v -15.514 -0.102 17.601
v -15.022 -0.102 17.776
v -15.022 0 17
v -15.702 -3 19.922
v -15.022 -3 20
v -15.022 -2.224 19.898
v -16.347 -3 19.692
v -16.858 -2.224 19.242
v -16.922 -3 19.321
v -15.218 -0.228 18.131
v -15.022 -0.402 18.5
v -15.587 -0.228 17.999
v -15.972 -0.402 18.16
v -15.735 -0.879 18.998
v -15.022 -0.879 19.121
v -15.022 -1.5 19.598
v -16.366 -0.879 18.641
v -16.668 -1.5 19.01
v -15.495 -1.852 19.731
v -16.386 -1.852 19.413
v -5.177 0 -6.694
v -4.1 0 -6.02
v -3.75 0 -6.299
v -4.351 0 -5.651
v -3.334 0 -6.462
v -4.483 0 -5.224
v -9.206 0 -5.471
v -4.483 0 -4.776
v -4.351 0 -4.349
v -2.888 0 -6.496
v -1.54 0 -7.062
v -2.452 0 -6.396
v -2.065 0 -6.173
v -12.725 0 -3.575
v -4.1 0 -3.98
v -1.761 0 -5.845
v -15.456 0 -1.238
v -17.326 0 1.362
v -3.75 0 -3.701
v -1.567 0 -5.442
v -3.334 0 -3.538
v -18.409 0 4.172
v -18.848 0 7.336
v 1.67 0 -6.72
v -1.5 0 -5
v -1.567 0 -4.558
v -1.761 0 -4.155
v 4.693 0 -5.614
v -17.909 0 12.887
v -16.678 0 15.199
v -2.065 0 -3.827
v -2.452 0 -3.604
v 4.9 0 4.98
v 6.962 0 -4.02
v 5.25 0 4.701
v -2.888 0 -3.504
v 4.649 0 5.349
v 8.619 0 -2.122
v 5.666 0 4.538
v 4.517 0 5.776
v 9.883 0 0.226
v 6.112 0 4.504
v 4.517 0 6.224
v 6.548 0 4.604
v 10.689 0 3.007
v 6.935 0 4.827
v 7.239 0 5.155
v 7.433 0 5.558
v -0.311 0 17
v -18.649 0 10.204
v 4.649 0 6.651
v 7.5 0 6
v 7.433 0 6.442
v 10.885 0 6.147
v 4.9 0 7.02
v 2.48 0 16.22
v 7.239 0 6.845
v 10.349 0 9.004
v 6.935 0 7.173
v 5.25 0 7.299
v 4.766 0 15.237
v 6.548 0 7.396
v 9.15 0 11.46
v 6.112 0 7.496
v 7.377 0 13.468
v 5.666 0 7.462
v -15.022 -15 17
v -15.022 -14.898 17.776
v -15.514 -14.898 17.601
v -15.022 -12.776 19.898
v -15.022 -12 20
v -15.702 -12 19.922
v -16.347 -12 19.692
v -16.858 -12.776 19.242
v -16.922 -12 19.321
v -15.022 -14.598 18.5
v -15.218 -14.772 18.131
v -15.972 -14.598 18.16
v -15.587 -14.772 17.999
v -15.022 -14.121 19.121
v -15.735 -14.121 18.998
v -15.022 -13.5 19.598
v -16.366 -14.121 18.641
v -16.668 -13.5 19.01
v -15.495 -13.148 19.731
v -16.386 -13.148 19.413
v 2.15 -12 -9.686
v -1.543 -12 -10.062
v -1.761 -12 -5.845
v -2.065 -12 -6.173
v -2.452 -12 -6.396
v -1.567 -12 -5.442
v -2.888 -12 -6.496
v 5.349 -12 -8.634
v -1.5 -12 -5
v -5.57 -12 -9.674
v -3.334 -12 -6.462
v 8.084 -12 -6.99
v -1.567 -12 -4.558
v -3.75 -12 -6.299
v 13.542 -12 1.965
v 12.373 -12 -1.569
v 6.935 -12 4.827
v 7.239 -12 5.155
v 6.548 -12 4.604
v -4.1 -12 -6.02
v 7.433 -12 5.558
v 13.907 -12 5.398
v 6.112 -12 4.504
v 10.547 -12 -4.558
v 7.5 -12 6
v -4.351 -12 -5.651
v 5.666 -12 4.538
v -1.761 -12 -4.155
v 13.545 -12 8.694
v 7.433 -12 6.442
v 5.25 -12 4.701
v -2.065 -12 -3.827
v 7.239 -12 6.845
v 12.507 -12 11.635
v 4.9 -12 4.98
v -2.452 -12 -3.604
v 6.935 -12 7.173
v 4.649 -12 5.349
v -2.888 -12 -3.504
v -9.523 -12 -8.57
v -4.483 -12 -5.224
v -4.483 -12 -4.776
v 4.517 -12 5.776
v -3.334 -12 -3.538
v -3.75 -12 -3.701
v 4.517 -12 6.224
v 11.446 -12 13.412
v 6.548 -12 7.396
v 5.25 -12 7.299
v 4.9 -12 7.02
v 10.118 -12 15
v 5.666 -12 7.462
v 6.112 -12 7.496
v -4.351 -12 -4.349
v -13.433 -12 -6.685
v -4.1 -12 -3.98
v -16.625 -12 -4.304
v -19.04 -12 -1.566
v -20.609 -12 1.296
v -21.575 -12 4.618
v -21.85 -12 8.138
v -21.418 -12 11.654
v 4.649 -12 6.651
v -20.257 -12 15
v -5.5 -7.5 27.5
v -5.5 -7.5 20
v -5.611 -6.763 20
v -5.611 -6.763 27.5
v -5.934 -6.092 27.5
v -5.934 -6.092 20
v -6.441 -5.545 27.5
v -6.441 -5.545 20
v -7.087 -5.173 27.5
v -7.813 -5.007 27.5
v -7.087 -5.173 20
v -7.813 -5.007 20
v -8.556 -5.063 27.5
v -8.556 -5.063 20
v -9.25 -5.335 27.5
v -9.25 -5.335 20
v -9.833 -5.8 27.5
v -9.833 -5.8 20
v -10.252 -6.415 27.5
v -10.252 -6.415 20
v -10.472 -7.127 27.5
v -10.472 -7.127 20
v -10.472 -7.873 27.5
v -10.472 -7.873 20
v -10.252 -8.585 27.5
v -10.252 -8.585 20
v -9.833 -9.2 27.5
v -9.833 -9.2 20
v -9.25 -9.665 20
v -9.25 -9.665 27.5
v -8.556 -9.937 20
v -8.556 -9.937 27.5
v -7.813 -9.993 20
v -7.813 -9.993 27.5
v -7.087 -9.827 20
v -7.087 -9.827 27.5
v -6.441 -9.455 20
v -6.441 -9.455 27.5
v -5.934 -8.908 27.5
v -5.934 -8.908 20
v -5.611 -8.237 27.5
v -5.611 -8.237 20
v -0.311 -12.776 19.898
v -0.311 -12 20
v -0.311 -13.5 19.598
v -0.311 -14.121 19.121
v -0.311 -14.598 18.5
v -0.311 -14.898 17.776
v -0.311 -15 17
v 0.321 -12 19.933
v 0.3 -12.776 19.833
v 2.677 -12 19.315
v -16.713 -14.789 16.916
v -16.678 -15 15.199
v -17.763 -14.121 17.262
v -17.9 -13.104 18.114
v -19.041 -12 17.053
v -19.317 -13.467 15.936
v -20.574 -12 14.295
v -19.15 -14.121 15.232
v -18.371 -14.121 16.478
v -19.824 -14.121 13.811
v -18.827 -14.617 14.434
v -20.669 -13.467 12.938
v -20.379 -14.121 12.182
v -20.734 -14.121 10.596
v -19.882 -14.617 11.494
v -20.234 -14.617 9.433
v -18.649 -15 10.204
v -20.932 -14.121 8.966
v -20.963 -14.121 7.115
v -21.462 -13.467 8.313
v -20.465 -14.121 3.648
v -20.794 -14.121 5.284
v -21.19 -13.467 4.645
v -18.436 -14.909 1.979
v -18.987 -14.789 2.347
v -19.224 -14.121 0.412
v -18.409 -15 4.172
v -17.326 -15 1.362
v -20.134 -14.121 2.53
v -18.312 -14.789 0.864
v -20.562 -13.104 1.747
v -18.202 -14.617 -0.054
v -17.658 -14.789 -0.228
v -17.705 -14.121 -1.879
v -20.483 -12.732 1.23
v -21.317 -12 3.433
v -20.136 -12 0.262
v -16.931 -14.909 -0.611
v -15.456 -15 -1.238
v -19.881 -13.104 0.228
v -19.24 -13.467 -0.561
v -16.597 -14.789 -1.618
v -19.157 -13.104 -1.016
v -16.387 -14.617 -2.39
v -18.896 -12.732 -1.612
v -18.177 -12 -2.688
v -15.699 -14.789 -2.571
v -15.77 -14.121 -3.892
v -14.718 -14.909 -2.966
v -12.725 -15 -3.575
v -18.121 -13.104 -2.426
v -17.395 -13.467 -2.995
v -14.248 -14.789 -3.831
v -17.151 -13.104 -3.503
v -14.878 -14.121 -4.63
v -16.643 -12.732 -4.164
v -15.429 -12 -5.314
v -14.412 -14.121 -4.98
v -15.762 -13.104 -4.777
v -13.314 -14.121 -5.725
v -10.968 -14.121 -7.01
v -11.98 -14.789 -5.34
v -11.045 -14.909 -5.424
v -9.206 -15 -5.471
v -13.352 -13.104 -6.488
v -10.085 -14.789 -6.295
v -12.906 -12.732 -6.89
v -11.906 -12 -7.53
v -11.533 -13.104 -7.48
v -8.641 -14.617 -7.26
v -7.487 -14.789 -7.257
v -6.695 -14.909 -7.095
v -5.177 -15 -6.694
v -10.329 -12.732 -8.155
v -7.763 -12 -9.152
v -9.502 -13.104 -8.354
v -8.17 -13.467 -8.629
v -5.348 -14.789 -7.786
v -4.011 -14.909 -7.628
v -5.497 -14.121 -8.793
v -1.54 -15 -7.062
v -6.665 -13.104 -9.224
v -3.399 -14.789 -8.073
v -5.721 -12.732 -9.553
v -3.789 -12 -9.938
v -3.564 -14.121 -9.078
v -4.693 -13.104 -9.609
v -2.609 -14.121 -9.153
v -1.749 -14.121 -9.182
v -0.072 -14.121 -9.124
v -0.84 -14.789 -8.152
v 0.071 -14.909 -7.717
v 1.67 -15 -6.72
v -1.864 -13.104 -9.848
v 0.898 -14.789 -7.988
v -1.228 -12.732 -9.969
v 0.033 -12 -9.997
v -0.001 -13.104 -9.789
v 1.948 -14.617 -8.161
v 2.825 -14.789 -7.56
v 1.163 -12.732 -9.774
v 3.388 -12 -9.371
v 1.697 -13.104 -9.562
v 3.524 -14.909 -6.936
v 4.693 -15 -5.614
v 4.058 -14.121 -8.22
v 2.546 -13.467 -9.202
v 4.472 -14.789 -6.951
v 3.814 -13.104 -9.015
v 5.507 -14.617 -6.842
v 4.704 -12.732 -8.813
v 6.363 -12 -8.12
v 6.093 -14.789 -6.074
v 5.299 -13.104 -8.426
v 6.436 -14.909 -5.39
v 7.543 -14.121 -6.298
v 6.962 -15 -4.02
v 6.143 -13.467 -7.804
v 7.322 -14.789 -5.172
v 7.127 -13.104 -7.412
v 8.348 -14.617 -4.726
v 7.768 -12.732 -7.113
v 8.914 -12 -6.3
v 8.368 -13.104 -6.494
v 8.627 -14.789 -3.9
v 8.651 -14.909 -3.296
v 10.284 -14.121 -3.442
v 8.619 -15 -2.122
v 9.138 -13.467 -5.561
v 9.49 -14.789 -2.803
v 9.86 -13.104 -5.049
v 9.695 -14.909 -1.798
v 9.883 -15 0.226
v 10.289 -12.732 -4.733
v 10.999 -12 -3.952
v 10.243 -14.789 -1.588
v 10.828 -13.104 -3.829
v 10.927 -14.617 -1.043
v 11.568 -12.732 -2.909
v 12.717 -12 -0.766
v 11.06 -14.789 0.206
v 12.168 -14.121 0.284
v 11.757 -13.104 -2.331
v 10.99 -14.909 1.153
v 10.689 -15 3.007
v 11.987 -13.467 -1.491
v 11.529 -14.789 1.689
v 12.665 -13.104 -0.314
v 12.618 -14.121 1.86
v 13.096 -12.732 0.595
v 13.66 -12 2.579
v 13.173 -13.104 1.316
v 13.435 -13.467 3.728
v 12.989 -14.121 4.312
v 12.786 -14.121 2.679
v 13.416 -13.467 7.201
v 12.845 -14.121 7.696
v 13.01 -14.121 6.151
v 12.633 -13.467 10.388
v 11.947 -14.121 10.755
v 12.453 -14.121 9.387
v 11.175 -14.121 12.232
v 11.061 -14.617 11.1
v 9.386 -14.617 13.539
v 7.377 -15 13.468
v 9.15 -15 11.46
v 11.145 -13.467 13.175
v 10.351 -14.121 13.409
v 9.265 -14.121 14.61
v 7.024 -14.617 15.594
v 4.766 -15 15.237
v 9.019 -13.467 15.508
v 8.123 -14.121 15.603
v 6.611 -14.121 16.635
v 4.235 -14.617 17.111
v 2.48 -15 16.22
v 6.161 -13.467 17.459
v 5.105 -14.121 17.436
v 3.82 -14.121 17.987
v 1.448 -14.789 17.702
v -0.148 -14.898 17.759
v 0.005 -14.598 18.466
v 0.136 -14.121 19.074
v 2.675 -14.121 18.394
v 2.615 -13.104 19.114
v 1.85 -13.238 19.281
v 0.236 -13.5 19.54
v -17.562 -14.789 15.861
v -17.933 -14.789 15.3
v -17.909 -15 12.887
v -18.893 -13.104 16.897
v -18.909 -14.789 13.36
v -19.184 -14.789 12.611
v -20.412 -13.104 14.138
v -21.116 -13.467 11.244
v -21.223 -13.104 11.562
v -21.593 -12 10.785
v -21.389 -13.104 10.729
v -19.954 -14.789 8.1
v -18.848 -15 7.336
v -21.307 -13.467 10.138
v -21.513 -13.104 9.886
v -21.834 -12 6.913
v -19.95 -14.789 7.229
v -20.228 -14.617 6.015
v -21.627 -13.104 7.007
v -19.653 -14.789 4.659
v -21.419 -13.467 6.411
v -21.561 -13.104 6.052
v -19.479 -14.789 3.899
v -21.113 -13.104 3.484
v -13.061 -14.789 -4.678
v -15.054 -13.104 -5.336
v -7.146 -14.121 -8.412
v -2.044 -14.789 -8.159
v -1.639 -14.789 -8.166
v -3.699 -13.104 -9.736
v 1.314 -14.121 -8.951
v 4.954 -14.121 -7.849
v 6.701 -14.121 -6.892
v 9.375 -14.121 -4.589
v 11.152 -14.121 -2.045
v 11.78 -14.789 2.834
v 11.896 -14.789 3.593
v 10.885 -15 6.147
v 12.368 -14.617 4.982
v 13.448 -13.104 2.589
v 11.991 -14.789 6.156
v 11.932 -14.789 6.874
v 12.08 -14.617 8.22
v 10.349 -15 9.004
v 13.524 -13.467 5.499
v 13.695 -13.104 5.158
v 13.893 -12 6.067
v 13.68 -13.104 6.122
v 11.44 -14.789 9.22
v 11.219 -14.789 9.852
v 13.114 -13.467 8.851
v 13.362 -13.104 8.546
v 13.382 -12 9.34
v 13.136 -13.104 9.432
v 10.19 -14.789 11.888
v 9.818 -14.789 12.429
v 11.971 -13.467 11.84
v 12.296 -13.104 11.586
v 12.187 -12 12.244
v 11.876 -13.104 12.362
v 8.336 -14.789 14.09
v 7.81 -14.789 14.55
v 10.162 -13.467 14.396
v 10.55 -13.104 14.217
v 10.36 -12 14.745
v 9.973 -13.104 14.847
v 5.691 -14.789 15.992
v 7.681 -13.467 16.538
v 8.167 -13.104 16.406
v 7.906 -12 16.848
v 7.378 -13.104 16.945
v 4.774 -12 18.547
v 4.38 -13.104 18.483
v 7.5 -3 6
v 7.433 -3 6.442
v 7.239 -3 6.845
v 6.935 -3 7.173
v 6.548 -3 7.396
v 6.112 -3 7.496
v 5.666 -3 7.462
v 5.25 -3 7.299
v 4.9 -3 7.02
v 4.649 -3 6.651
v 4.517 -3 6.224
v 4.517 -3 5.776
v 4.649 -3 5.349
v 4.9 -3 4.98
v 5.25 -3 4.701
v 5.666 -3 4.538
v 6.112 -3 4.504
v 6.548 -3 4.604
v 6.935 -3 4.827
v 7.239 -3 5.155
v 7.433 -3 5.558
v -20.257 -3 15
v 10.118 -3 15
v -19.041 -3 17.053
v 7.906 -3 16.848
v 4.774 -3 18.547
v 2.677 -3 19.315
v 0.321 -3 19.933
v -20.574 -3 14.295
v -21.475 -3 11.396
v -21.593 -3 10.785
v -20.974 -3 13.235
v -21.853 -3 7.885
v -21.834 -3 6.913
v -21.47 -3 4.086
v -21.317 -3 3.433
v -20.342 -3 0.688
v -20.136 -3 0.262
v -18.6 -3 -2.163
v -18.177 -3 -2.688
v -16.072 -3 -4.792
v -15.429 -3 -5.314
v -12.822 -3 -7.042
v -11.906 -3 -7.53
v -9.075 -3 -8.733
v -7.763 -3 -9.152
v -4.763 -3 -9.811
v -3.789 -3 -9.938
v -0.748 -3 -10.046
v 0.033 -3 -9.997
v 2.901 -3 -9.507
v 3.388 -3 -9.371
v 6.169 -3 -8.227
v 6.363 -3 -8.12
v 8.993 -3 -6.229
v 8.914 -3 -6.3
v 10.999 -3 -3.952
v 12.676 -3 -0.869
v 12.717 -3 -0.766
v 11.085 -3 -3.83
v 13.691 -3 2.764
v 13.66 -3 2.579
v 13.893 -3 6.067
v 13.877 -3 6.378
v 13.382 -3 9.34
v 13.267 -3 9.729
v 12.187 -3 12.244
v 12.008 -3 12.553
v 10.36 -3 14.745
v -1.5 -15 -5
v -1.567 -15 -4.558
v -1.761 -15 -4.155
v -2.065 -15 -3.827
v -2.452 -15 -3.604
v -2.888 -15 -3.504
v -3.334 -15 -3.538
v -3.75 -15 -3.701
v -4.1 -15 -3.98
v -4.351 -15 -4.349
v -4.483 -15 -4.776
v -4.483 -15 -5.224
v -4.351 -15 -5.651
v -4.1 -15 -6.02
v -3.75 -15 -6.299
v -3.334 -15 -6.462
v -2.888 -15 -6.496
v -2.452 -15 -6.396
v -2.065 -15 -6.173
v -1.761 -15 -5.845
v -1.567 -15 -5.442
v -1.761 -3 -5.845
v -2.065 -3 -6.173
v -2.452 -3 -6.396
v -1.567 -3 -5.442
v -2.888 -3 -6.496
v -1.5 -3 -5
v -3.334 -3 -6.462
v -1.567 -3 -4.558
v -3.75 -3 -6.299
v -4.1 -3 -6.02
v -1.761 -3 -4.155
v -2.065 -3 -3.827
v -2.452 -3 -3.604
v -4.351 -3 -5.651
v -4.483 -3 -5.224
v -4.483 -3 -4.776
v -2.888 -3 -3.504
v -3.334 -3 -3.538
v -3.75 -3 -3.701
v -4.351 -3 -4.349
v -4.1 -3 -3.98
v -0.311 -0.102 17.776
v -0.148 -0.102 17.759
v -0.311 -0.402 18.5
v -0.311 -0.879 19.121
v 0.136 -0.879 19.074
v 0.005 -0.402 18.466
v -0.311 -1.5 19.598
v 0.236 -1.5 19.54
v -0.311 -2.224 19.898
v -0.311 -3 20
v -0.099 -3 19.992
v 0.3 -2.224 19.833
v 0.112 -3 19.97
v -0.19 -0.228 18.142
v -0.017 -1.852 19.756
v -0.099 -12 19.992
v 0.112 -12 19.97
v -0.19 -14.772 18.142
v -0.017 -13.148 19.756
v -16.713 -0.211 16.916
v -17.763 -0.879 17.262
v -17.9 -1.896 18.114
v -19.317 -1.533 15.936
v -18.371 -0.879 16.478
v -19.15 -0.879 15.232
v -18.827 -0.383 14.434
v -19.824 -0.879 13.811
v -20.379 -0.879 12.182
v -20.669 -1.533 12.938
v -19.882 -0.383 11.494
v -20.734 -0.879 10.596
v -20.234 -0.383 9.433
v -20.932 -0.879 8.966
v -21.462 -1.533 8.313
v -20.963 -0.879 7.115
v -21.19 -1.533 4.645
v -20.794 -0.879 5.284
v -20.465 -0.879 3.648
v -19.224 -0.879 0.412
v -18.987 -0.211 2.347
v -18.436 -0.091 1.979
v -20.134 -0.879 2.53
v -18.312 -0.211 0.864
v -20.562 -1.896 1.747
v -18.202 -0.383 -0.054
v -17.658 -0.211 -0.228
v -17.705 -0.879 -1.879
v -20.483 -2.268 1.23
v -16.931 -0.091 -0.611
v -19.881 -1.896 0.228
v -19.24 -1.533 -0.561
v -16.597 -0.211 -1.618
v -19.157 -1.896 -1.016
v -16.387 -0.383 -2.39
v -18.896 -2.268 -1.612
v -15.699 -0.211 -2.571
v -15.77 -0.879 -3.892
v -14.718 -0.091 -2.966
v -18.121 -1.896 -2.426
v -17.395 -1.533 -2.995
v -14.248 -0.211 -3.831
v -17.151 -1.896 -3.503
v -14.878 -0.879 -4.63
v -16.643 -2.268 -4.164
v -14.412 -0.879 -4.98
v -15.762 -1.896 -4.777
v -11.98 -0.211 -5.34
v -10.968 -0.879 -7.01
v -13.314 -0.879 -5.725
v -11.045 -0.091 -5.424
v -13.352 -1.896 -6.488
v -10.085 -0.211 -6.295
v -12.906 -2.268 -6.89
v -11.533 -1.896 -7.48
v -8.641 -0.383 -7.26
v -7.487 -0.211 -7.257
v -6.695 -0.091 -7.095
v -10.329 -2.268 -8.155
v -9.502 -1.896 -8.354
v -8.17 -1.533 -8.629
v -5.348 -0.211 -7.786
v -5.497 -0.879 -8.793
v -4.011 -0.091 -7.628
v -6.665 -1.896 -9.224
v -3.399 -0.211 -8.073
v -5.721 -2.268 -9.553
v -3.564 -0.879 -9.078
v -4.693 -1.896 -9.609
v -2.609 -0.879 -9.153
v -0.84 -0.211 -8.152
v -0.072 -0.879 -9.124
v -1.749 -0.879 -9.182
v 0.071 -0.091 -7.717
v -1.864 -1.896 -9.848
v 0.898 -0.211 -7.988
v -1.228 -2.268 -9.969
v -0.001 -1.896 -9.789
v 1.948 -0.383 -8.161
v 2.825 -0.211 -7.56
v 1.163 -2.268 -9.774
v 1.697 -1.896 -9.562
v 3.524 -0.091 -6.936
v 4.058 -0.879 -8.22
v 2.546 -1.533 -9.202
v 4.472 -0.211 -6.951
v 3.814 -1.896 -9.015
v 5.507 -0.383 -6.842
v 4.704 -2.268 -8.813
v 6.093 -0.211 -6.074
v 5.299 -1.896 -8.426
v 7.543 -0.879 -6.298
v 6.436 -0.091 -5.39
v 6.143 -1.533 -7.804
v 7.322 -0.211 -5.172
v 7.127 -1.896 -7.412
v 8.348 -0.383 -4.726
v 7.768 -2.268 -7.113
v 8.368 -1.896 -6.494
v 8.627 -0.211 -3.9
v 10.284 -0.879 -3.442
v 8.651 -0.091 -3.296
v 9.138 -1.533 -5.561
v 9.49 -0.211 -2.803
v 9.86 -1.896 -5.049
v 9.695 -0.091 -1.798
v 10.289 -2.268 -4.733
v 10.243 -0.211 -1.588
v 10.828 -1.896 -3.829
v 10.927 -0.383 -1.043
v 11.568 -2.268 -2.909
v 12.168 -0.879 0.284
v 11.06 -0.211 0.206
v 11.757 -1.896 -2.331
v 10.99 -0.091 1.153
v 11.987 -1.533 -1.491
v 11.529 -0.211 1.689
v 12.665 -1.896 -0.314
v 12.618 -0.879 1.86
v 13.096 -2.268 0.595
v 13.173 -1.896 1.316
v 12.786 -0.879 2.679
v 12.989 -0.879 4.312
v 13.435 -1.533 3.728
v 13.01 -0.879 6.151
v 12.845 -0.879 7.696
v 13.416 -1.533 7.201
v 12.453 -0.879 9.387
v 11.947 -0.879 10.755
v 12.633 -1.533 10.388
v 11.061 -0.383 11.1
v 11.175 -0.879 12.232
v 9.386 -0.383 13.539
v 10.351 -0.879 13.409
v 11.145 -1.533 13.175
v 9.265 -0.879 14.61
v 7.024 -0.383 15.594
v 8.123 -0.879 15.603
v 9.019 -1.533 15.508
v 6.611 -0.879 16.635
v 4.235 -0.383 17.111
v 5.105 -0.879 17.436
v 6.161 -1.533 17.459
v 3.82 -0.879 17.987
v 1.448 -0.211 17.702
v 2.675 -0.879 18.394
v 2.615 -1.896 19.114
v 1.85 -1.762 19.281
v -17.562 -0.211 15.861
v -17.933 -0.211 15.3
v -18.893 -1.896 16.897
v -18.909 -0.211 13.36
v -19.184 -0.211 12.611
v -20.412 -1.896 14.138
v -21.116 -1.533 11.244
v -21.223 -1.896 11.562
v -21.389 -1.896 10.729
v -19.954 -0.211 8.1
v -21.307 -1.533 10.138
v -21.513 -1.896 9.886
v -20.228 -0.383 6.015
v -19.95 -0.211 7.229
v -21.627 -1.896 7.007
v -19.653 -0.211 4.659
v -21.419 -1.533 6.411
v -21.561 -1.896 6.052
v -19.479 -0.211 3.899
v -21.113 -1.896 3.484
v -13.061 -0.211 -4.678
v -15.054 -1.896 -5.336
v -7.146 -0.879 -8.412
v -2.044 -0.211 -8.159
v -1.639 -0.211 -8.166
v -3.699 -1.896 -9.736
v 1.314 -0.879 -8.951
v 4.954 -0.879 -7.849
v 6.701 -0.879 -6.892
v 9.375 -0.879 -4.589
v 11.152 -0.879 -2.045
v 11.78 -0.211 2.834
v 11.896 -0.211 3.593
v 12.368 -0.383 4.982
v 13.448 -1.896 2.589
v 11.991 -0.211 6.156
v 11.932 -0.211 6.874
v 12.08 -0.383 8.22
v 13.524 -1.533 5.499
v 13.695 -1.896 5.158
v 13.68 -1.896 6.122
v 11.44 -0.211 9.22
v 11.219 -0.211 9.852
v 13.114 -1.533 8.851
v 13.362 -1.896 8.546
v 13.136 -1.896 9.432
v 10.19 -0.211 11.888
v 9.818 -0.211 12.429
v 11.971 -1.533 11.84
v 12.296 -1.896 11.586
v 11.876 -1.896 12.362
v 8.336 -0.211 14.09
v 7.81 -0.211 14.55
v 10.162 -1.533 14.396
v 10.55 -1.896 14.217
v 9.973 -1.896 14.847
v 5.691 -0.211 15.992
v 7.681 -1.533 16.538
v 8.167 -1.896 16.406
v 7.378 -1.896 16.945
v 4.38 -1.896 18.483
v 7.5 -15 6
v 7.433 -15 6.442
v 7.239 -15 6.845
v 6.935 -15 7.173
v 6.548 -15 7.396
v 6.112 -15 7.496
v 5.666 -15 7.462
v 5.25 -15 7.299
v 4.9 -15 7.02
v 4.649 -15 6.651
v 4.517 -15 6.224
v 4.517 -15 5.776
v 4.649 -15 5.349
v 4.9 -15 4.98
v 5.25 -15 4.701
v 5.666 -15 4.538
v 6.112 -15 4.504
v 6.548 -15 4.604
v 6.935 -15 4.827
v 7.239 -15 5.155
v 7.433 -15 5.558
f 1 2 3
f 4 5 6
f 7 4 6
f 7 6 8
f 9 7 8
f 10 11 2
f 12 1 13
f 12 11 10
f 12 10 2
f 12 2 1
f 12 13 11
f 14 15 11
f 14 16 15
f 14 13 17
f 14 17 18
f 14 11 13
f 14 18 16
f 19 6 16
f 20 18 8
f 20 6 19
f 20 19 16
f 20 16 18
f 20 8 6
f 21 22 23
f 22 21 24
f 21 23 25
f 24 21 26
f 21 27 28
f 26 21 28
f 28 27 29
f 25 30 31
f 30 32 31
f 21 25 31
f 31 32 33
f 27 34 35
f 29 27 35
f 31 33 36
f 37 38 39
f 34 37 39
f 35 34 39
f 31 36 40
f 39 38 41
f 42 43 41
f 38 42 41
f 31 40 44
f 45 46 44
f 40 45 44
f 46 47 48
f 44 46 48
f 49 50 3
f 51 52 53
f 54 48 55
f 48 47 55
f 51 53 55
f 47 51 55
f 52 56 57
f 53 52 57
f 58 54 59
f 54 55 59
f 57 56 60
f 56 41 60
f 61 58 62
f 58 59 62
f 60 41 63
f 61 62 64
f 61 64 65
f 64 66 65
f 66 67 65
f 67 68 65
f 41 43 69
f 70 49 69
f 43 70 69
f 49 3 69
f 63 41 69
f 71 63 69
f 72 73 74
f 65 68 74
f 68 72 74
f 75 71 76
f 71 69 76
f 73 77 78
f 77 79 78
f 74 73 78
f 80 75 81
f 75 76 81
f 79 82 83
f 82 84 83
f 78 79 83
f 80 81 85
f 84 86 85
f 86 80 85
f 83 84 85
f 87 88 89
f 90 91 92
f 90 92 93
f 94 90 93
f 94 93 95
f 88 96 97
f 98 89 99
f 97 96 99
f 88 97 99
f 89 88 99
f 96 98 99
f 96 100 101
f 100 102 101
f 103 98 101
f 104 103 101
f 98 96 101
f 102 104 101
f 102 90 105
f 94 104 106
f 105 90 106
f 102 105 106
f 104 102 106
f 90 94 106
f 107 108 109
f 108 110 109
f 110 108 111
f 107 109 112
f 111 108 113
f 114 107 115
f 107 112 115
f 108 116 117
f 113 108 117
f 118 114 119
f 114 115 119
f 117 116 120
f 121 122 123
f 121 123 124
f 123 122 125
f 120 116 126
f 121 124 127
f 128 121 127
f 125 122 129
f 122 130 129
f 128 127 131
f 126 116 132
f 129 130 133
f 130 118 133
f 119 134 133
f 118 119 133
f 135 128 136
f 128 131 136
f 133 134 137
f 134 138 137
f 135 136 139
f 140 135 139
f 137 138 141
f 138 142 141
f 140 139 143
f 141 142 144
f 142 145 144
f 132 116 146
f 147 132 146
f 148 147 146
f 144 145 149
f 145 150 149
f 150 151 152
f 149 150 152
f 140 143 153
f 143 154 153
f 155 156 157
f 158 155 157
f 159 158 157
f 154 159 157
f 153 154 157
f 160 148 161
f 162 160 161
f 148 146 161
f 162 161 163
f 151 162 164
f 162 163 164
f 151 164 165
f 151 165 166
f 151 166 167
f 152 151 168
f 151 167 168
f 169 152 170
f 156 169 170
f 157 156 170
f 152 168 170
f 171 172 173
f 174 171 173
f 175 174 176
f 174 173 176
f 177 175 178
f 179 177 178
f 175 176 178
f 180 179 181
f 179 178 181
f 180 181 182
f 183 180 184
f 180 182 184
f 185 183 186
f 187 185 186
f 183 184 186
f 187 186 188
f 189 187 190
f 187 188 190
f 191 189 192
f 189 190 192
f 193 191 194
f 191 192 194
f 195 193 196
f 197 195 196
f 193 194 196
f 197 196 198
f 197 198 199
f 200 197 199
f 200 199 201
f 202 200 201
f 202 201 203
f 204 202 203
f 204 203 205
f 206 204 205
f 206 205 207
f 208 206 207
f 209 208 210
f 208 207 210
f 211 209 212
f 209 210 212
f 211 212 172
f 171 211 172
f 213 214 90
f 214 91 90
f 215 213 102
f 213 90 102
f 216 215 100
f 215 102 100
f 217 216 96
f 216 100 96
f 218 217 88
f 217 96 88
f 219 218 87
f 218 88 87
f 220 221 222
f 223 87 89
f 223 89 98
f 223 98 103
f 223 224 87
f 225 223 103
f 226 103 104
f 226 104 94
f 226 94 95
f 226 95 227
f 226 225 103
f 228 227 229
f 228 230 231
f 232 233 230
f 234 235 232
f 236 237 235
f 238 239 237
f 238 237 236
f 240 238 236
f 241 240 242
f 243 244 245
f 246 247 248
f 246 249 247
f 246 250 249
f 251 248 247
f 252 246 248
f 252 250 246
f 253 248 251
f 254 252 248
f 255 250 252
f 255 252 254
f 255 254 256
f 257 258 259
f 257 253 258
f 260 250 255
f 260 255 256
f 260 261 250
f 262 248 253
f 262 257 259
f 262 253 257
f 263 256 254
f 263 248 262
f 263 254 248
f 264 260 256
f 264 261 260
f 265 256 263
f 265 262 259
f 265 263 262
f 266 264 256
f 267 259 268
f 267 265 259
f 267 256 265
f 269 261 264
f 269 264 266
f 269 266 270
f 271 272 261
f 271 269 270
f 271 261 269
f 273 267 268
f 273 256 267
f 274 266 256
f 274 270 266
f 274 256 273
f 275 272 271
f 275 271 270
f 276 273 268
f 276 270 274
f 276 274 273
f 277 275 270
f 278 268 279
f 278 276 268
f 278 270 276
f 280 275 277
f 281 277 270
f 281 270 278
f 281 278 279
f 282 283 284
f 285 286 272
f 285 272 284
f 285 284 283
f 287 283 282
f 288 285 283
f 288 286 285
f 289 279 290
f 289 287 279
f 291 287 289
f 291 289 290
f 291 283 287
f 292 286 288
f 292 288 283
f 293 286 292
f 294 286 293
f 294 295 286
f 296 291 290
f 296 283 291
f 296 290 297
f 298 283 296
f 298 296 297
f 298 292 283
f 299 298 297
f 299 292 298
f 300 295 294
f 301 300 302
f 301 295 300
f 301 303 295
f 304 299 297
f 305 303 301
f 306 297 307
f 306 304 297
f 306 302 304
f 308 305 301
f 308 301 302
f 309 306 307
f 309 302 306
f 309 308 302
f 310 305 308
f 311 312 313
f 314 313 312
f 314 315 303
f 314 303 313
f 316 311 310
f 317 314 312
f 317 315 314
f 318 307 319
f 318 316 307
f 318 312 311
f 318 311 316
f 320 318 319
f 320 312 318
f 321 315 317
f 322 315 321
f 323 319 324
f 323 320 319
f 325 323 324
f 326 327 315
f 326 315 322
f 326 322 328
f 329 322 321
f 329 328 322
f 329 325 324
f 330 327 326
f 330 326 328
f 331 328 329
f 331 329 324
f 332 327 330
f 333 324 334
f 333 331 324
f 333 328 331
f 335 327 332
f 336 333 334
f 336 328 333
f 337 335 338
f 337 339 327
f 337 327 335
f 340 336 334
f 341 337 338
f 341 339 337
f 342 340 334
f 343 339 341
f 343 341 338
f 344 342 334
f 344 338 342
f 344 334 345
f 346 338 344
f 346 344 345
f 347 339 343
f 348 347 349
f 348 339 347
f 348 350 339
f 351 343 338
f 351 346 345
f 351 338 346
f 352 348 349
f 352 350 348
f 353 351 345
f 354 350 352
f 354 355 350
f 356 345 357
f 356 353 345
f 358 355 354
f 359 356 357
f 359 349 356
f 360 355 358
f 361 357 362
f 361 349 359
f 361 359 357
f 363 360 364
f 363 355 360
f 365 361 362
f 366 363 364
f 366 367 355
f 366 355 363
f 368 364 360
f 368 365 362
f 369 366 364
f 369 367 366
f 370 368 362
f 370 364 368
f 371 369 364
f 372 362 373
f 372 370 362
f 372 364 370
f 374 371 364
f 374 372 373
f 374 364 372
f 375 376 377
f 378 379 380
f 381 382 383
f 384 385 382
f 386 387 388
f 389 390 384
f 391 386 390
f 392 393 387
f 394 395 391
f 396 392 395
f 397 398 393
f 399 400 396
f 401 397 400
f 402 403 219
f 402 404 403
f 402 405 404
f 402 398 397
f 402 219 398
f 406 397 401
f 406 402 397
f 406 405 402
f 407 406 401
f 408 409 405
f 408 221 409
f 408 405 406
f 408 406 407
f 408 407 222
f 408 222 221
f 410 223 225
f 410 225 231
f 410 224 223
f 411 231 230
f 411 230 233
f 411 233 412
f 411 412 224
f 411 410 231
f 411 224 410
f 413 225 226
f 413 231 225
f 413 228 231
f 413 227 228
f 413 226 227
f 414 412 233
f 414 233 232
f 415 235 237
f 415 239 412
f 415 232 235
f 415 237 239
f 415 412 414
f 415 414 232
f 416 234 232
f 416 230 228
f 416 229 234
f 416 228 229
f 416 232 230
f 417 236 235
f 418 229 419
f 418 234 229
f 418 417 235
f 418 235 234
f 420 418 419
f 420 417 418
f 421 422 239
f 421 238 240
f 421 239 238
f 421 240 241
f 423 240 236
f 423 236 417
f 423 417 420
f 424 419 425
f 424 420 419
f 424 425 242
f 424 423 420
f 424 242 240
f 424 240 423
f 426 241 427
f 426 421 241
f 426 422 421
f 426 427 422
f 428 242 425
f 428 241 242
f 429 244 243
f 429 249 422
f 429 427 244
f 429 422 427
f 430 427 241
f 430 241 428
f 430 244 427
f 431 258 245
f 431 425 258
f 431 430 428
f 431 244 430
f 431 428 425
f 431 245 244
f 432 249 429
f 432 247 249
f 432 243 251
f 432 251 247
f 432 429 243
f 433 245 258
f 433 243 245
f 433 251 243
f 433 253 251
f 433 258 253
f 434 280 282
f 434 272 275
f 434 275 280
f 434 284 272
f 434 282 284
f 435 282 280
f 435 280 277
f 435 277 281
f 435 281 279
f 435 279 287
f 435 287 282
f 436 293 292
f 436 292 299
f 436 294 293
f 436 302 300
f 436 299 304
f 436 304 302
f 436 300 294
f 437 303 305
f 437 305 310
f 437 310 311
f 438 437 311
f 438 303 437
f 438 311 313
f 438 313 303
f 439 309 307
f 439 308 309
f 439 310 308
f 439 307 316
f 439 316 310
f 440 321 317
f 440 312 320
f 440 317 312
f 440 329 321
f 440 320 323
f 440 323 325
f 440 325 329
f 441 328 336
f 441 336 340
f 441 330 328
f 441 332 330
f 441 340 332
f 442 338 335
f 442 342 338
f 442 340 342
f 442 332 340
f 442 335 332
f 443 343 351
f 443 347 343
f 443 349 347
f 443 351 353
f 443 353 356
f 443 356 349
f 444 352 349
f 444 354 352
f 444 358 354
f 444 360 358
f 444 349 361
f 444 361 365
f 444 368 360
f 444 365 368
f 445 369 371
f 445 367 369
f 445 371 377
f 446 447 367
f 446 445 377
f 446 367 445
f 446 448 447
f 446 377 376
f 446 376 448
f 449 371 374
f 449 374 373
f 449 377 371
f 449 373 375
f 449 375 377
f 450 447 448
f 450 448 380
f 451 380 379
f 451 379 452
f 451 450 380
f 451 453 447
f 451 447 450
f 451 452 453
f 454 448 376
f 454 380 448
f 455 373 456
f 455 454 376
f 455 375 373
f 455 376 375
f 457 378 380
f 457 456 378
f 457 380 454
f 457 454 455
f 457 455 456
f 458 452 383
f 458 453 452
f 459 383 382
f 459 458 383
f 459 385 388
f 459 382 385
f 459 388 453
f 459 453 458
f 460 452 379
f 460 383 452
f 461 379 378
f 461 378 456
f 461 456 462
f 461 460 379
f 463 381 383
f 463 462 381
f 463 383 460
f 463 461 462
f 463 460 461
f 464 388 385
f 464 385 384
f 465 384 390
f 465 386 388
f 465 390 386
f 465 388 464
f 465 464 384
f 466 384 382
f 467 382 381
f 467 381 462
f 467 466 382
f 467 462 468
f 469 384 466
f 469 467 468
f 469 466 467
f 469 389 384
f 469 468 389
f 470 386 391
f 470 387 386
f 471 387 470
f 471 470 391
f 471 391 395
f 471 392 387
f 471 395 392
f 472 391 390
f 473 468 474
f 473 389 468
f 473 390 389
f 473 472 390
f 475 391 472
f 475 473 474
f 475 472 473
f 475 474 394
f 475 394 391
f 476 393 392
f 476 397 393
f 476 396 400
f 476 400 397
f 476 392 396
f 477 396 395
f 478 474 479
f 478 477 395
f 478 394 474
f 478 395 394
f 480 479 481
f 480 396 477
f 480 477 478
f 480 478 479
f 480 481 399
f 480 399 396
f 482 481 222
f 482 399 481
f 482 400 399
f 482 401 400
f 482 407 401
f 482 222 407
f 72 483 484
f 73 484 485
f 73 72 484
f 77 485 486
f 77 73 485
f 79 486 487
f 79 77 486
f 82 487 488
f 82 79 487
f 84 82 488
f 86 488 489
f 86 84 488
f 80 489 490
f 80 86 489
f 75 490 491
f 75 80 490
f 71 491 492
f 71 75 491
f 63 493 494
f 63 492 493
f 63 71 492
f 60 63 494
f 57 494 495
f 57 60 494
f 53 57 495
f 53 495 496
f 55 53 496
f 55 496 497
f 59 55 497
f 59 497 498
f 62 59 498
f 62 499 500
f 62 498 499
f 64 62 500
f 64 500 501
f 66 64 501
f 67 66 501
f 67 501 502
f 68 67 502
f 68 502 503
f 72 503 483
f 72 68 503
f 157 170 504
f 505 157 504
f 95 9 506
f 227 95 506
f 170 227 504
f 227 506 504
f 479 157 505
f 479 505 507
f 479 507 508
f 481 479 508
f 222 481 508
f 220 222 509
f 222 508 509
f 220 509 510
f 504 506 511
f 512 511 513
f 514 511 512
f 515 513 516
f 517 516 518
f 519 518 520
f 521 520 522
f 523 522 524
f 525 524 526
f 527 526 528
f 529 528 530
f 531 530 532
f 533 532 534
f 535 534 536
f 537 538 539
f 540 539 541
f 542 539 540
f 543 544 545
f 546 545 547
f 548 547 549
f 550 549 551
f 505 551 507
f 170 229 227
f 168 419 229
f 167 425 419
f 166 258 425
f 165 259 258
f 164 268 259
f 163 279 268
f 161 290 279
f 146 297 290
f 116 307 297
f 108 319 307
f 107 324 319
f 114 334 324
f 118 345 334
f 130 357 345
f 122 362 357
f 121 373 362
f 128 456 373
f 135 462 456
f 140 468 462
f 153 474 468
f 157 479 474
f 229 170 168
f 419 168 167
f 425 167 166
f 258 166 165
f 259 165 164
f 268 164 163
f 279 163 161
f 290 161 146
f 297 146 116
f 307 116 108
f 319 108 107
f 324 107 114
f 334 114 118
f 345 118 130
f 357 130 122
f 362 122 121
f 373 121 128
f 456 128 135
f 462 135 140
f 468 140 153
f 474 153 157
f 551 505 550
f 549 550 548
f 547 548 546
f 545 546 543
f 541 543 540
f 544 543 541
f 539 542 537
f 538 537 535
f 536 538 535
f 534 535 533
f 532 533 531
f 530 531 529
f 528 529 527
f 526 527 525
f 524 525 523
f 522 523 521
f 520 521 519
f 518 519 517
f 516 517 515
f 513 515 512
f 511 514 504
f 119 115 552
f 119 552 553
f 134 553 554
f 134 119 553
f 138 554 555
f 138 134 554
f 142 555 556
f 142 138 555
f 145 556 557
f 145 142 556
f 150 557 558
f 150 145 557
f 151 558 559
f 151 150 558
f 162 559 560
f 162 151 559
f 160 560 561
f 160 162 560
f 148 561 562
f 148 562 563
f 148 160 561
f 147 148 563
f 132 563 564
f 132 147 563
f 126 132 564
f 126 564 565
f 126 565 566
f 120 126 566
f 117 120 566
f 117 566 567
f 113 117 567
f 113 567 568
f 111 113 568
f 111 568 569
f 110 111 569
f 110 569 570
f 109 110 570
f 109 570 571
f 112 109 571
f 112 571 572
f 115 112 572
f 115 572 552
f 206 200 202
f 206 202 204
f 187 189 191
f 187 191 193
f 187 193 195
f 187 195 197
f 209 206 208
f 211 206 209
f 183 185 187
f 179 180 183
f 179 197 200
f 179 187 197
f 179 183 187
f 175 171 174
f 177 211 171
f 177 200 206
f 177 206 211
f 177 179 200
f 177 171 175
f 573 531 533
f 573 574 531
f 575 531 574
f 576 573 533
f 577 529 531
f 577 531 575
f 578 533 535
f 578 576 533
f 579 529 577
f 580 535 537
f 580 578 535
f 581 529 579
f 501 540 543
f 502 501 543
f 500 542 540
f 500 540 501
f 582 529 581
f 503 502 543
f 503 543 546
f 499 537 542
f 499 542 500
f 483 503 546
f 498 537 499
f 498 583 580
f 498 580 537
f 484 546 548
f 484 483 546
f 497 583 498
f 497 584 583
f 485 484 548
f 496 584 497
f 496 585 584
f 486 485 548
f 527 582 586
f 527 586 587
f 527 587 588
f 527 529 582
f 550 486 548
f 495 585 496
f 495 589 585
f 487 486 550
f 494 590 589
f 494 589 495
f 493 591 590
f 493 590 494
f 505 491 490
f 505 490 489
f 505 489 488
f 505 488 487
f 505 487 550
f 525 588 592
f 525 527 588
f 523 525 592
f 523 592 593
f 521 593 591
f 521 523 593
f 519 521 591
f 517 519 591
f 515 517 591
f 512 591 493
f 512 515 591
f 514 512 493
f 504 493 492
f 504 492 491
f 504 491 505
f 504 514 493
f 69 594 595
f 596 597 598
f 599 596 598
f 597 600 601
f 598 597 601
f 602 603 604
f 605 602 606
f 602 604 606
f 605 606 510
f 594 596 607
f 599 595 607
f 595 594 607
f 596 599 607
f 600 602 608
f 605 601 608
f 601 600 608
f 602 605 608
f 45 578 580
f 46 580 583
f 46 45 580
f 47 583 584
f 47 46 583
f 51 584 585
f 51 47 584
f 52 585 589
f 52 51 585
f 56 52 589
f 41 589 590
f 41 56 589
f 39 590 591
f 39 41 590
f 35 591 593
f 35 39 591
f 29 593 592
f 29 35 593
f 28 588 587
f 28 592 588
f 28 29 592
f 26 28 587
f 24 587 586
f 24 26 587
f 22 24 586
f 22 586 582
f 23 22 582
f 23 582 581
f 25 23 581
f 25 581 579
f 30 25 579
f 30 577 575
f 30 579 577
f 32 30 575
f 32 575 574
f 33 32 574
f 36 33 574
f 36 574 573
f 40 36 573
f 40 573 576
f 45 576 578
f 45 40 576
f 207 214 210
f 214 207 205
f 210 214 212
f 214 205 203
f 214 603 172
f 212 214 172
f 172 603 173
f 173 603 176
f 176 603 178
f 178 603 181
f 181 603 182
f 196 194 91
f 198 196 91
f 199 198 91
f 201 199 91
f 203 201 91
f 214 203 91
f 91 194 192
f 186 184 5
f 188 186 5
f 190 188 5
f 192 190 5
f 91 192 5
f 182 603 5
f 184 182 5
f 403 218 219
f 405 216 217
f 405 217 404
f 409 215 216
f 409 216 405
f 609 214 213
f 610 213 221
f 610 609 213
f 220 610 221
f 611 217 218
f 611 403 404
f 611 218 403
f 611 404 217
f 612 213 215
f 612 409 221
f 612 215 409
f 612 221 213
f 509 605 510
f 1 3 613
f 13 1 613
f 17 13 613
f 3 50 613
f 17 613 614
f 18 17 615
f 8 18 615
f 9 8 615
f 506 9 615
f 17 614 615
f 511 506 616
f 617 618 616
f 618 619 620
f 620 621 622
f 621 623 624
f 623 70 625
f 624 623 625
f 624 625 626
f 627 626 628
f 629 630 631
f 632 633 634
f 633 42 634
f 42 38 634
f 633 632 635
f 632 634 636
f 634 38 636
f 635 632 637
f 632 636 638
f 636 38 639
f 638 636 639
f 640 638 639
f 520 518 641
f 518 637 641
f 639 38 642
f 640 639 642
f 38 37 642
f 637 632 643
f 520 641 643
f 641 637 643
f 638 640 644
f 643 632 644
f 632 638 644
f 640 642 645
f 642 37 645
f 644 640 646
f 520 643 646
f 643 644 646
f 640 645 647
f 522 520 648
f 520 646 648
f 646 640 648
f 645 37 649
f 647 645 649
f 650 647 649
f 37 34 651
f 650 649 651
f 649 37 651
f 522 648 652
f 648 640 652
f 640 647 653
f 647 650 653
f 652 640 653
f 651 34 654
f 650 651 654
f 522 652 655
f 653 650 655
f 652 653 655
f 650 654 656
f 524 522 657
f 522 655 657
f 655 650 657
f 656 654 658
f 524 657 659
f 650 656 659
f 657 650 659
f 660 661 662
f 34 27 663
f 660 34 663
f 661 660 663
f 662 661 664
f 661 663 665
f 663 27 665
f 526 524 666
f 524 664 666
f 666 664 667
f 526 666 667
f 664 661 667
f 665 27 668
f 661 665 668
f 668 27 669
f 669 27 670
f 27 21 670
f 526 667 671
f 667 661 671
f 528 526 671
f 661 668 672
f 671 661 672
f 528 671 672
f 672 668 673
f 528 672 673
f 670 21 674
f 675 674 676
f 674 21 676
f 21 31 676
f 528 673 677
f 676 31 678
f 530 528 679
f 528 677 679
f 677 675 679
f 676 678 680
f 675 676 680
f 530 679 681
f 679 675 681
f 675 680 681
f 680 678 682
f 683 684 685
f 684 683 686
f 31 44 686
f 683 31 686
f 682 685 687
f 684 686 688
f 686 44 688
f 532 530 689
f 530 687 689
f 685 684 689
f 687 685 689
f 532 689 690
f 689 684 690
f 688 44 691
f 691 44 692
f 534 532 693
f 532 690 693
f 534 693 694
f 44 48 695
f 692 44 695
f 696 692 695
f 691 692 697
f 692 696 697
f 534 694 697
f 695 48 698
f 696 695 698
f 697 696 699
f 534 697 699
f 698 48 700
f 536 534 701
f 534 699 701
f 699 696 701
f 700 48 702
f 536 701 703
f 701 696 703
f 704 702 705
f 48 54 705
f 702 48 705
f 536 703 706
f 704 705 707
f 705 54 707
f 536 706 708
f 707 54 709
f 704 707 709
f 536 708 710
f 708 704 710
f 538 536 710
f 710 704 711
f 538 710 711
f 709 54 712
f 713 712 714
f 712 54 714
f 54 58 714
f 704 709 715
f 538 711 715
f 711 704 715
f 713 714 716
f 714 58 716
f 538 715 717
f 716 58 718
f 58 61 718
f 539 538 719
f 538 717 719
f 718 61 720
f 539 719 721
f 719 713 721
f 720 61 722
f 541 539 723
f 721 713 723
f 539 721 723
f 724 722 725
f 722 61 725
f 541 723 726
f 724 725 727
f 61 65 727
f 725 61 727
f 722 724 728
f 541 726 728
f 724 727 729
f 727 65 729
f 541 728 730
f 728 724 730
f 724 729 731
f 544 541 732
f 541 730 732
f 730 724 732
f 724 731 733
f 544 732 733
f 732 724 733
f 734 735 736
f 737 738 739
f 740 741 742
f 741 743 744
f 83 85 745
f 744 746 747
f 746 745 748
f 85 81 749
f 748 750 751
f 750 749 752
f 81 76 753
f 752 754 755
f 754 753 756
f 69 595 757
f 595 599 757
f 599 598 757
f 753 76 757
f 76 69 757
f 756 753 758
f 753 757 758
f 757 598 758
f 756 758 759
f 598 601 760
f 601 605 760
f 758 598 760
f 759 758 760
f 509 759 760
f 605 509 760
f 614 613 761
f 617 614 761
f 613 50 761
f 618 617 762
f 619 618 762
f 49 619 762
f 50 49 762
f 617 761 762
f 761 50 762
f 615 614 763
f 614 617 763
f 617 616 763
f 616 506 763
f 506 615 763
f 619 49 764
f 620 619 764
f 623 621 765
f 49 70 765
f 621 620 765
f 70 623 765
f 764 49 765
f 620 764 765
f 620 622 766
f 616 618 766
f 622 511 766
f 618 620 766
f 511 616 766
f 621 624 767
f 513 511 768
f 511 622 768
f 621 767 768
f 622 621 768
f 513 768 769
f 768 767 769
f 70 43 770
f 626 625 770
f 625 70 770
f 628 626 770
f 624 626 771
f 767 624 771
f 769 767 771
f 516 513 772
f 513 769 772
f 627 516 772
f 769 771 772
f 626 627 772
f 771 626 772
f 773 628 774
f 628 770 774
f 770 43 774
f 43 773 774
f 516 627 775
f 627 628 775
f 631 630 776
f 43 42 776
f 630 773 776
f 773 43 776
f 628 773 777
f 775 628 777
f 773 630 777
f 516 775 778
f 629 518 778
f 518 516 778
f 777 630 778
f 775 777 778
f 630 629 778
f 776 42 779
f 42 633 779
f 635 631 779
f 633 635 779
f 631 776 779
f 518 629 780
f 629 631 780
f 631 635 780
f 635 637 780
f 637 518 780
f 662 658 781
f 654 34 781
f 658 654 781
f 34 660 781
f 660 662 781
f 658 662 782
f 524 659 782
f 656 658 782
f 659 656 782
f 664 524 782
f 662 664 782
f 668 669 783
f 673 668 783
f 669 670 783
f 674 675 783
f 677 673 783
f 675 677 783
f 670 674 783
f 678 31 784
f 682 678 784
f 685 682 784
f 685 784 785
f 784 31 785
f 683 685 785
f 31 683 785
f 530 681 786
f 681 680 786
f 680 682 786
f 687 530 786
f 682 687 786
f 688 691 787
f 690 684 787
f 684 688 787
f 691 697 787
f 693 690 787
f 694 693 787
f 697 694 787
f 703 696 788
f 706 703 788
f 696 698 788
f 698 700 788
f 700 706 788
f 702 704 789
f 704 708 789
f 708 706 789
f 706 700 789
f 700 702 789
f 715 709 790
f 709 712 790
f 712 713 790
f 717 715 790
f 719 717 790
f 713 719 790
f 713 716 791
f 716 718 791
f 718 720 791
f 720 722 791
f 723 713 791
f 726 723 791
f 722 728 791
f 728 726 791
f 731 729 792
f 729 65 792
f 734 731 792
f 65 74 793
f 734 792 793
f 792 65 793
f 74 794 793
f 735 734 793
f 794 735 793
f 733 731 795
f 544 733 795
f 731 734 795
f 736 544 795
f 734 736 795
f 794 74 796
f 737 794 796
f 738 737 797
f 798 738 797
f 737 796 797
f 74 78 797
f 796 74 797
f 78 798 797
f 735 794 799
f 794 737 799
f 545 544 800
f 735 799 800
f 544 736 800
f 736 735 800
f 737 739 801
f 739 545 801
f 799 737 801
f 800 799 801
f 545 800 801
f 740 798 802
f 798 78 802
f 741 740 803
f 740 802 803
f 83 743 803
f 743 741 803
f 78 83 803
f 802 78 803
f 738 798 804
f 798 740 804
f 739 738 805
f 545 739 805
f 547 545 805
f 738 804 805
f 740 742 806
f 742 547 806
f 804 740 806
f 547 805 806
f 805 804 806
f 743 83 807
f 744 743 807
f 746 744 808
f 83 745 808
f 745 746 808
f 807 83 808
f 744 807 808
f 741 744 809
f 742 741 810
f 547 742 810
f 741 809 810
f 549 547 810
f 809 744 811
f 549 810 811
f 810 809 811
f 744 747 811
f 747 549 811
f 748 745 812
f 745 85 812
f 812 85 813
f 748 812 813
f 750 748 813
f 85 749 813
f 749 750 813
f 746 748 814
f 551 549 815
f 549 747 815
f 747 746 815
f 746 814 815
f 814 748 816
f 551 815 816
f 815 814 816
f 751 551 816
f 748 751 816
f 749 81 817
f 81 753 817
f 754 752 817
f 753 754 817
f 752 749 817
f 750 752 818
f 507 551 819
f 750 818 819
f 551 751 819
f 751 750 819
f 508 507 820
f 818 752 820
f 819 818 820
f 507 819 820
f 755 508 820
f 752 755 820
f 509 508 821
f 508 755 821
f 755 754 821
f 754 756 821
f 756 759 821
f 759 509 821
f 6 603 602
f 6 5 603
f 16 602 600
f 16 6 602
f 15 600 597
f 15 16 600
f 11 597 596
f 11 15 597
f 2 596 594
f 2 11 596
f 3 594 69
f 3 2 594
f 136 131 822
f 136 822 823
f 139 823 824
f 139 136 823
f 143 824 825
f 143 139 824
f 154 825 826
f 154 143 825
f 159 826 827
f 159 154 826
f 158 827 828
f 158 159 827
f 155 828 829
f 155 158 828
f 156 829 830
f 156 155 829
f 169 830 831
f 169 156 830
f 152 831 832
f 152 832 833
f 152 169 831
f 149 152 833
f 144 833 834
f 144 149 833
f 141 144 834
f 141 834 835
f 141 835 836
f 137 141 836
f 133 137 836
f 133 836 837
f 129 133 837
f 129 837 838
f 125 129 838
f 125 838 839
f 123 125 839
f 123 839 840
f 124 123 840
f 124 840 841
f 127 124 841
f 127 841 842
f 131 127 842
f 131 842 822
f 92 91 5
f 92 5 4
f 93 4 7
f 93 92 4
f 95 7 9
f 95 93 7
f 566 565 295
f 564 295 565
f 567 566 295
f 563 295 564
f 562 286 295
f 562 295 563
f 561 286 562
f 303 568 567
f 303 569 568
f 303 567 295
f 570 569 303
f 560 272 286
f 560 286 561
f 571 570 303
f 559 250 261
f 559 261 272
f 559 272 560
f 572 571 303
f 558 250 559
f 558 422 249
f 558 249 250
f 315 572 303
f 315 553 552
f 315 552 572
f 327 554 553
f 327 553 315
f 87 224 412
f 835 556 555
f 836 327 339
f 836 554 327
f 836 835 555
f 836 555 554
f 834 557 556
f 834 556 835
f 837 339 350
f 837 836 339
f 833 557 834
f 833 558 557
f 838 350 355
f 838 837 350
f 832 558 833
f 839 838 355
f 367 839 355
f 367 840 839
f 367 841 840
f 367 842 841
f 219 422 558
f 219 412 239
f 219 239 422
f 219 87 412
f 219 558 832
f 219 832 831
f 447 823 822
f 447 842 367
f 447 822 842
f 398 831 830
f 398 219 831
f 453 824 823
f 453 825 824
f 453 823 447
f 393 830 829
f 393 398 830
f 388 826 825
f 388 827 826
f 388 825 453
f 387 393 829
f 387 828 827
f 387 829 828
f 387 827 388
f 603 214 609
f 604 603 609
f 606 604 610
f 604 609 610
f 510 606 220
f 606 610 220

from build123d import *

# Parameters (mm, degrees)
F0_R     = 1.5
F1_DEPTH = 15
F2_R     = 2.5
F3_DEPTH = 7.5
F4_W     = 9
F4_H     = 26
F5_DEPTH = 25
F6_DEPTH = 25
F7_R     = 2.99999


# Not quite as in the source:
# - a fillet or chamfer is up to 0.001 mm smaller than in the source, because OpenCascade refuses the exact size


with BuildPart() as f1:
    # F0 (on Front) → F1 (new body)
    with BuildSketch(Plane.XZ):
        with BuildLine():
            Line((0, 20), (-16, 20))
            add(Edge.make_bspline(
                [(-16, 20), (-21.9968855381, 16.0502213985), (-25.0508954103, -3.343971526), (0.5714094097, -13.7693570255), (16.8200319307, -1.4098083557), (13.6831020936, 17.2049123794), (0, 20)],
                knots=[0, 0, 0, 0, 0.2484326246, 0.5085550507, 0.7313335966, 1, 1, 1, 1], degree=3))
        make_face()
        with Locations((-3, -5)):
            Circle(F0_R, mode=Mode.SUBTRACT)
        with Locations((6, 6)):
            Circle(F0_R, mode=Mode.SUBTRACT)
    extrude(amount=F1_DEPTH)

    # F2 (on face) → F3 (join)
    with BuildSketch(Plane.XY.offset(20)):
        with Locations((-8, -7.5)):
            Circle(F2_R)
    extrude(amount=F3_DEPTH)

    # F4 (on Right) → F5 (cut)
    with BuildSketch(Plane.YZ):
        with Locations((-7.5, 2)):
            Rectangle(F4_W, F4_H)
    extrude(amount=-F5_DEPTH, mode=Mode.SUBTRACT)

    # F4 (on Right) → F6 (cut)
    with BuildSketch(Plane.YZ):
        with Locations((-7.5, 2)):
            Rectangle(F4_W, F4_H)
    extrude(amount=F6_DEPTH, mode=Mode.SUBTRACT)

    # F7 (radius 3 in the source; OpenCascade refuses exactly that, so slightly less here)
    f7_edges = [f1.edges().sort_by_distance(p)[0] for p in [
        (-8, -15, 20),
        (-8, 0, 20),
        (-0.375905, 0, -10.026879),
        (-0.375905, -15, -10.026879),
        (-16, -7.5, 20),
        (0, -7.5, 20),
    ]]
    fillet(f7_edges, radius=F7_R)


solid = f1.part
